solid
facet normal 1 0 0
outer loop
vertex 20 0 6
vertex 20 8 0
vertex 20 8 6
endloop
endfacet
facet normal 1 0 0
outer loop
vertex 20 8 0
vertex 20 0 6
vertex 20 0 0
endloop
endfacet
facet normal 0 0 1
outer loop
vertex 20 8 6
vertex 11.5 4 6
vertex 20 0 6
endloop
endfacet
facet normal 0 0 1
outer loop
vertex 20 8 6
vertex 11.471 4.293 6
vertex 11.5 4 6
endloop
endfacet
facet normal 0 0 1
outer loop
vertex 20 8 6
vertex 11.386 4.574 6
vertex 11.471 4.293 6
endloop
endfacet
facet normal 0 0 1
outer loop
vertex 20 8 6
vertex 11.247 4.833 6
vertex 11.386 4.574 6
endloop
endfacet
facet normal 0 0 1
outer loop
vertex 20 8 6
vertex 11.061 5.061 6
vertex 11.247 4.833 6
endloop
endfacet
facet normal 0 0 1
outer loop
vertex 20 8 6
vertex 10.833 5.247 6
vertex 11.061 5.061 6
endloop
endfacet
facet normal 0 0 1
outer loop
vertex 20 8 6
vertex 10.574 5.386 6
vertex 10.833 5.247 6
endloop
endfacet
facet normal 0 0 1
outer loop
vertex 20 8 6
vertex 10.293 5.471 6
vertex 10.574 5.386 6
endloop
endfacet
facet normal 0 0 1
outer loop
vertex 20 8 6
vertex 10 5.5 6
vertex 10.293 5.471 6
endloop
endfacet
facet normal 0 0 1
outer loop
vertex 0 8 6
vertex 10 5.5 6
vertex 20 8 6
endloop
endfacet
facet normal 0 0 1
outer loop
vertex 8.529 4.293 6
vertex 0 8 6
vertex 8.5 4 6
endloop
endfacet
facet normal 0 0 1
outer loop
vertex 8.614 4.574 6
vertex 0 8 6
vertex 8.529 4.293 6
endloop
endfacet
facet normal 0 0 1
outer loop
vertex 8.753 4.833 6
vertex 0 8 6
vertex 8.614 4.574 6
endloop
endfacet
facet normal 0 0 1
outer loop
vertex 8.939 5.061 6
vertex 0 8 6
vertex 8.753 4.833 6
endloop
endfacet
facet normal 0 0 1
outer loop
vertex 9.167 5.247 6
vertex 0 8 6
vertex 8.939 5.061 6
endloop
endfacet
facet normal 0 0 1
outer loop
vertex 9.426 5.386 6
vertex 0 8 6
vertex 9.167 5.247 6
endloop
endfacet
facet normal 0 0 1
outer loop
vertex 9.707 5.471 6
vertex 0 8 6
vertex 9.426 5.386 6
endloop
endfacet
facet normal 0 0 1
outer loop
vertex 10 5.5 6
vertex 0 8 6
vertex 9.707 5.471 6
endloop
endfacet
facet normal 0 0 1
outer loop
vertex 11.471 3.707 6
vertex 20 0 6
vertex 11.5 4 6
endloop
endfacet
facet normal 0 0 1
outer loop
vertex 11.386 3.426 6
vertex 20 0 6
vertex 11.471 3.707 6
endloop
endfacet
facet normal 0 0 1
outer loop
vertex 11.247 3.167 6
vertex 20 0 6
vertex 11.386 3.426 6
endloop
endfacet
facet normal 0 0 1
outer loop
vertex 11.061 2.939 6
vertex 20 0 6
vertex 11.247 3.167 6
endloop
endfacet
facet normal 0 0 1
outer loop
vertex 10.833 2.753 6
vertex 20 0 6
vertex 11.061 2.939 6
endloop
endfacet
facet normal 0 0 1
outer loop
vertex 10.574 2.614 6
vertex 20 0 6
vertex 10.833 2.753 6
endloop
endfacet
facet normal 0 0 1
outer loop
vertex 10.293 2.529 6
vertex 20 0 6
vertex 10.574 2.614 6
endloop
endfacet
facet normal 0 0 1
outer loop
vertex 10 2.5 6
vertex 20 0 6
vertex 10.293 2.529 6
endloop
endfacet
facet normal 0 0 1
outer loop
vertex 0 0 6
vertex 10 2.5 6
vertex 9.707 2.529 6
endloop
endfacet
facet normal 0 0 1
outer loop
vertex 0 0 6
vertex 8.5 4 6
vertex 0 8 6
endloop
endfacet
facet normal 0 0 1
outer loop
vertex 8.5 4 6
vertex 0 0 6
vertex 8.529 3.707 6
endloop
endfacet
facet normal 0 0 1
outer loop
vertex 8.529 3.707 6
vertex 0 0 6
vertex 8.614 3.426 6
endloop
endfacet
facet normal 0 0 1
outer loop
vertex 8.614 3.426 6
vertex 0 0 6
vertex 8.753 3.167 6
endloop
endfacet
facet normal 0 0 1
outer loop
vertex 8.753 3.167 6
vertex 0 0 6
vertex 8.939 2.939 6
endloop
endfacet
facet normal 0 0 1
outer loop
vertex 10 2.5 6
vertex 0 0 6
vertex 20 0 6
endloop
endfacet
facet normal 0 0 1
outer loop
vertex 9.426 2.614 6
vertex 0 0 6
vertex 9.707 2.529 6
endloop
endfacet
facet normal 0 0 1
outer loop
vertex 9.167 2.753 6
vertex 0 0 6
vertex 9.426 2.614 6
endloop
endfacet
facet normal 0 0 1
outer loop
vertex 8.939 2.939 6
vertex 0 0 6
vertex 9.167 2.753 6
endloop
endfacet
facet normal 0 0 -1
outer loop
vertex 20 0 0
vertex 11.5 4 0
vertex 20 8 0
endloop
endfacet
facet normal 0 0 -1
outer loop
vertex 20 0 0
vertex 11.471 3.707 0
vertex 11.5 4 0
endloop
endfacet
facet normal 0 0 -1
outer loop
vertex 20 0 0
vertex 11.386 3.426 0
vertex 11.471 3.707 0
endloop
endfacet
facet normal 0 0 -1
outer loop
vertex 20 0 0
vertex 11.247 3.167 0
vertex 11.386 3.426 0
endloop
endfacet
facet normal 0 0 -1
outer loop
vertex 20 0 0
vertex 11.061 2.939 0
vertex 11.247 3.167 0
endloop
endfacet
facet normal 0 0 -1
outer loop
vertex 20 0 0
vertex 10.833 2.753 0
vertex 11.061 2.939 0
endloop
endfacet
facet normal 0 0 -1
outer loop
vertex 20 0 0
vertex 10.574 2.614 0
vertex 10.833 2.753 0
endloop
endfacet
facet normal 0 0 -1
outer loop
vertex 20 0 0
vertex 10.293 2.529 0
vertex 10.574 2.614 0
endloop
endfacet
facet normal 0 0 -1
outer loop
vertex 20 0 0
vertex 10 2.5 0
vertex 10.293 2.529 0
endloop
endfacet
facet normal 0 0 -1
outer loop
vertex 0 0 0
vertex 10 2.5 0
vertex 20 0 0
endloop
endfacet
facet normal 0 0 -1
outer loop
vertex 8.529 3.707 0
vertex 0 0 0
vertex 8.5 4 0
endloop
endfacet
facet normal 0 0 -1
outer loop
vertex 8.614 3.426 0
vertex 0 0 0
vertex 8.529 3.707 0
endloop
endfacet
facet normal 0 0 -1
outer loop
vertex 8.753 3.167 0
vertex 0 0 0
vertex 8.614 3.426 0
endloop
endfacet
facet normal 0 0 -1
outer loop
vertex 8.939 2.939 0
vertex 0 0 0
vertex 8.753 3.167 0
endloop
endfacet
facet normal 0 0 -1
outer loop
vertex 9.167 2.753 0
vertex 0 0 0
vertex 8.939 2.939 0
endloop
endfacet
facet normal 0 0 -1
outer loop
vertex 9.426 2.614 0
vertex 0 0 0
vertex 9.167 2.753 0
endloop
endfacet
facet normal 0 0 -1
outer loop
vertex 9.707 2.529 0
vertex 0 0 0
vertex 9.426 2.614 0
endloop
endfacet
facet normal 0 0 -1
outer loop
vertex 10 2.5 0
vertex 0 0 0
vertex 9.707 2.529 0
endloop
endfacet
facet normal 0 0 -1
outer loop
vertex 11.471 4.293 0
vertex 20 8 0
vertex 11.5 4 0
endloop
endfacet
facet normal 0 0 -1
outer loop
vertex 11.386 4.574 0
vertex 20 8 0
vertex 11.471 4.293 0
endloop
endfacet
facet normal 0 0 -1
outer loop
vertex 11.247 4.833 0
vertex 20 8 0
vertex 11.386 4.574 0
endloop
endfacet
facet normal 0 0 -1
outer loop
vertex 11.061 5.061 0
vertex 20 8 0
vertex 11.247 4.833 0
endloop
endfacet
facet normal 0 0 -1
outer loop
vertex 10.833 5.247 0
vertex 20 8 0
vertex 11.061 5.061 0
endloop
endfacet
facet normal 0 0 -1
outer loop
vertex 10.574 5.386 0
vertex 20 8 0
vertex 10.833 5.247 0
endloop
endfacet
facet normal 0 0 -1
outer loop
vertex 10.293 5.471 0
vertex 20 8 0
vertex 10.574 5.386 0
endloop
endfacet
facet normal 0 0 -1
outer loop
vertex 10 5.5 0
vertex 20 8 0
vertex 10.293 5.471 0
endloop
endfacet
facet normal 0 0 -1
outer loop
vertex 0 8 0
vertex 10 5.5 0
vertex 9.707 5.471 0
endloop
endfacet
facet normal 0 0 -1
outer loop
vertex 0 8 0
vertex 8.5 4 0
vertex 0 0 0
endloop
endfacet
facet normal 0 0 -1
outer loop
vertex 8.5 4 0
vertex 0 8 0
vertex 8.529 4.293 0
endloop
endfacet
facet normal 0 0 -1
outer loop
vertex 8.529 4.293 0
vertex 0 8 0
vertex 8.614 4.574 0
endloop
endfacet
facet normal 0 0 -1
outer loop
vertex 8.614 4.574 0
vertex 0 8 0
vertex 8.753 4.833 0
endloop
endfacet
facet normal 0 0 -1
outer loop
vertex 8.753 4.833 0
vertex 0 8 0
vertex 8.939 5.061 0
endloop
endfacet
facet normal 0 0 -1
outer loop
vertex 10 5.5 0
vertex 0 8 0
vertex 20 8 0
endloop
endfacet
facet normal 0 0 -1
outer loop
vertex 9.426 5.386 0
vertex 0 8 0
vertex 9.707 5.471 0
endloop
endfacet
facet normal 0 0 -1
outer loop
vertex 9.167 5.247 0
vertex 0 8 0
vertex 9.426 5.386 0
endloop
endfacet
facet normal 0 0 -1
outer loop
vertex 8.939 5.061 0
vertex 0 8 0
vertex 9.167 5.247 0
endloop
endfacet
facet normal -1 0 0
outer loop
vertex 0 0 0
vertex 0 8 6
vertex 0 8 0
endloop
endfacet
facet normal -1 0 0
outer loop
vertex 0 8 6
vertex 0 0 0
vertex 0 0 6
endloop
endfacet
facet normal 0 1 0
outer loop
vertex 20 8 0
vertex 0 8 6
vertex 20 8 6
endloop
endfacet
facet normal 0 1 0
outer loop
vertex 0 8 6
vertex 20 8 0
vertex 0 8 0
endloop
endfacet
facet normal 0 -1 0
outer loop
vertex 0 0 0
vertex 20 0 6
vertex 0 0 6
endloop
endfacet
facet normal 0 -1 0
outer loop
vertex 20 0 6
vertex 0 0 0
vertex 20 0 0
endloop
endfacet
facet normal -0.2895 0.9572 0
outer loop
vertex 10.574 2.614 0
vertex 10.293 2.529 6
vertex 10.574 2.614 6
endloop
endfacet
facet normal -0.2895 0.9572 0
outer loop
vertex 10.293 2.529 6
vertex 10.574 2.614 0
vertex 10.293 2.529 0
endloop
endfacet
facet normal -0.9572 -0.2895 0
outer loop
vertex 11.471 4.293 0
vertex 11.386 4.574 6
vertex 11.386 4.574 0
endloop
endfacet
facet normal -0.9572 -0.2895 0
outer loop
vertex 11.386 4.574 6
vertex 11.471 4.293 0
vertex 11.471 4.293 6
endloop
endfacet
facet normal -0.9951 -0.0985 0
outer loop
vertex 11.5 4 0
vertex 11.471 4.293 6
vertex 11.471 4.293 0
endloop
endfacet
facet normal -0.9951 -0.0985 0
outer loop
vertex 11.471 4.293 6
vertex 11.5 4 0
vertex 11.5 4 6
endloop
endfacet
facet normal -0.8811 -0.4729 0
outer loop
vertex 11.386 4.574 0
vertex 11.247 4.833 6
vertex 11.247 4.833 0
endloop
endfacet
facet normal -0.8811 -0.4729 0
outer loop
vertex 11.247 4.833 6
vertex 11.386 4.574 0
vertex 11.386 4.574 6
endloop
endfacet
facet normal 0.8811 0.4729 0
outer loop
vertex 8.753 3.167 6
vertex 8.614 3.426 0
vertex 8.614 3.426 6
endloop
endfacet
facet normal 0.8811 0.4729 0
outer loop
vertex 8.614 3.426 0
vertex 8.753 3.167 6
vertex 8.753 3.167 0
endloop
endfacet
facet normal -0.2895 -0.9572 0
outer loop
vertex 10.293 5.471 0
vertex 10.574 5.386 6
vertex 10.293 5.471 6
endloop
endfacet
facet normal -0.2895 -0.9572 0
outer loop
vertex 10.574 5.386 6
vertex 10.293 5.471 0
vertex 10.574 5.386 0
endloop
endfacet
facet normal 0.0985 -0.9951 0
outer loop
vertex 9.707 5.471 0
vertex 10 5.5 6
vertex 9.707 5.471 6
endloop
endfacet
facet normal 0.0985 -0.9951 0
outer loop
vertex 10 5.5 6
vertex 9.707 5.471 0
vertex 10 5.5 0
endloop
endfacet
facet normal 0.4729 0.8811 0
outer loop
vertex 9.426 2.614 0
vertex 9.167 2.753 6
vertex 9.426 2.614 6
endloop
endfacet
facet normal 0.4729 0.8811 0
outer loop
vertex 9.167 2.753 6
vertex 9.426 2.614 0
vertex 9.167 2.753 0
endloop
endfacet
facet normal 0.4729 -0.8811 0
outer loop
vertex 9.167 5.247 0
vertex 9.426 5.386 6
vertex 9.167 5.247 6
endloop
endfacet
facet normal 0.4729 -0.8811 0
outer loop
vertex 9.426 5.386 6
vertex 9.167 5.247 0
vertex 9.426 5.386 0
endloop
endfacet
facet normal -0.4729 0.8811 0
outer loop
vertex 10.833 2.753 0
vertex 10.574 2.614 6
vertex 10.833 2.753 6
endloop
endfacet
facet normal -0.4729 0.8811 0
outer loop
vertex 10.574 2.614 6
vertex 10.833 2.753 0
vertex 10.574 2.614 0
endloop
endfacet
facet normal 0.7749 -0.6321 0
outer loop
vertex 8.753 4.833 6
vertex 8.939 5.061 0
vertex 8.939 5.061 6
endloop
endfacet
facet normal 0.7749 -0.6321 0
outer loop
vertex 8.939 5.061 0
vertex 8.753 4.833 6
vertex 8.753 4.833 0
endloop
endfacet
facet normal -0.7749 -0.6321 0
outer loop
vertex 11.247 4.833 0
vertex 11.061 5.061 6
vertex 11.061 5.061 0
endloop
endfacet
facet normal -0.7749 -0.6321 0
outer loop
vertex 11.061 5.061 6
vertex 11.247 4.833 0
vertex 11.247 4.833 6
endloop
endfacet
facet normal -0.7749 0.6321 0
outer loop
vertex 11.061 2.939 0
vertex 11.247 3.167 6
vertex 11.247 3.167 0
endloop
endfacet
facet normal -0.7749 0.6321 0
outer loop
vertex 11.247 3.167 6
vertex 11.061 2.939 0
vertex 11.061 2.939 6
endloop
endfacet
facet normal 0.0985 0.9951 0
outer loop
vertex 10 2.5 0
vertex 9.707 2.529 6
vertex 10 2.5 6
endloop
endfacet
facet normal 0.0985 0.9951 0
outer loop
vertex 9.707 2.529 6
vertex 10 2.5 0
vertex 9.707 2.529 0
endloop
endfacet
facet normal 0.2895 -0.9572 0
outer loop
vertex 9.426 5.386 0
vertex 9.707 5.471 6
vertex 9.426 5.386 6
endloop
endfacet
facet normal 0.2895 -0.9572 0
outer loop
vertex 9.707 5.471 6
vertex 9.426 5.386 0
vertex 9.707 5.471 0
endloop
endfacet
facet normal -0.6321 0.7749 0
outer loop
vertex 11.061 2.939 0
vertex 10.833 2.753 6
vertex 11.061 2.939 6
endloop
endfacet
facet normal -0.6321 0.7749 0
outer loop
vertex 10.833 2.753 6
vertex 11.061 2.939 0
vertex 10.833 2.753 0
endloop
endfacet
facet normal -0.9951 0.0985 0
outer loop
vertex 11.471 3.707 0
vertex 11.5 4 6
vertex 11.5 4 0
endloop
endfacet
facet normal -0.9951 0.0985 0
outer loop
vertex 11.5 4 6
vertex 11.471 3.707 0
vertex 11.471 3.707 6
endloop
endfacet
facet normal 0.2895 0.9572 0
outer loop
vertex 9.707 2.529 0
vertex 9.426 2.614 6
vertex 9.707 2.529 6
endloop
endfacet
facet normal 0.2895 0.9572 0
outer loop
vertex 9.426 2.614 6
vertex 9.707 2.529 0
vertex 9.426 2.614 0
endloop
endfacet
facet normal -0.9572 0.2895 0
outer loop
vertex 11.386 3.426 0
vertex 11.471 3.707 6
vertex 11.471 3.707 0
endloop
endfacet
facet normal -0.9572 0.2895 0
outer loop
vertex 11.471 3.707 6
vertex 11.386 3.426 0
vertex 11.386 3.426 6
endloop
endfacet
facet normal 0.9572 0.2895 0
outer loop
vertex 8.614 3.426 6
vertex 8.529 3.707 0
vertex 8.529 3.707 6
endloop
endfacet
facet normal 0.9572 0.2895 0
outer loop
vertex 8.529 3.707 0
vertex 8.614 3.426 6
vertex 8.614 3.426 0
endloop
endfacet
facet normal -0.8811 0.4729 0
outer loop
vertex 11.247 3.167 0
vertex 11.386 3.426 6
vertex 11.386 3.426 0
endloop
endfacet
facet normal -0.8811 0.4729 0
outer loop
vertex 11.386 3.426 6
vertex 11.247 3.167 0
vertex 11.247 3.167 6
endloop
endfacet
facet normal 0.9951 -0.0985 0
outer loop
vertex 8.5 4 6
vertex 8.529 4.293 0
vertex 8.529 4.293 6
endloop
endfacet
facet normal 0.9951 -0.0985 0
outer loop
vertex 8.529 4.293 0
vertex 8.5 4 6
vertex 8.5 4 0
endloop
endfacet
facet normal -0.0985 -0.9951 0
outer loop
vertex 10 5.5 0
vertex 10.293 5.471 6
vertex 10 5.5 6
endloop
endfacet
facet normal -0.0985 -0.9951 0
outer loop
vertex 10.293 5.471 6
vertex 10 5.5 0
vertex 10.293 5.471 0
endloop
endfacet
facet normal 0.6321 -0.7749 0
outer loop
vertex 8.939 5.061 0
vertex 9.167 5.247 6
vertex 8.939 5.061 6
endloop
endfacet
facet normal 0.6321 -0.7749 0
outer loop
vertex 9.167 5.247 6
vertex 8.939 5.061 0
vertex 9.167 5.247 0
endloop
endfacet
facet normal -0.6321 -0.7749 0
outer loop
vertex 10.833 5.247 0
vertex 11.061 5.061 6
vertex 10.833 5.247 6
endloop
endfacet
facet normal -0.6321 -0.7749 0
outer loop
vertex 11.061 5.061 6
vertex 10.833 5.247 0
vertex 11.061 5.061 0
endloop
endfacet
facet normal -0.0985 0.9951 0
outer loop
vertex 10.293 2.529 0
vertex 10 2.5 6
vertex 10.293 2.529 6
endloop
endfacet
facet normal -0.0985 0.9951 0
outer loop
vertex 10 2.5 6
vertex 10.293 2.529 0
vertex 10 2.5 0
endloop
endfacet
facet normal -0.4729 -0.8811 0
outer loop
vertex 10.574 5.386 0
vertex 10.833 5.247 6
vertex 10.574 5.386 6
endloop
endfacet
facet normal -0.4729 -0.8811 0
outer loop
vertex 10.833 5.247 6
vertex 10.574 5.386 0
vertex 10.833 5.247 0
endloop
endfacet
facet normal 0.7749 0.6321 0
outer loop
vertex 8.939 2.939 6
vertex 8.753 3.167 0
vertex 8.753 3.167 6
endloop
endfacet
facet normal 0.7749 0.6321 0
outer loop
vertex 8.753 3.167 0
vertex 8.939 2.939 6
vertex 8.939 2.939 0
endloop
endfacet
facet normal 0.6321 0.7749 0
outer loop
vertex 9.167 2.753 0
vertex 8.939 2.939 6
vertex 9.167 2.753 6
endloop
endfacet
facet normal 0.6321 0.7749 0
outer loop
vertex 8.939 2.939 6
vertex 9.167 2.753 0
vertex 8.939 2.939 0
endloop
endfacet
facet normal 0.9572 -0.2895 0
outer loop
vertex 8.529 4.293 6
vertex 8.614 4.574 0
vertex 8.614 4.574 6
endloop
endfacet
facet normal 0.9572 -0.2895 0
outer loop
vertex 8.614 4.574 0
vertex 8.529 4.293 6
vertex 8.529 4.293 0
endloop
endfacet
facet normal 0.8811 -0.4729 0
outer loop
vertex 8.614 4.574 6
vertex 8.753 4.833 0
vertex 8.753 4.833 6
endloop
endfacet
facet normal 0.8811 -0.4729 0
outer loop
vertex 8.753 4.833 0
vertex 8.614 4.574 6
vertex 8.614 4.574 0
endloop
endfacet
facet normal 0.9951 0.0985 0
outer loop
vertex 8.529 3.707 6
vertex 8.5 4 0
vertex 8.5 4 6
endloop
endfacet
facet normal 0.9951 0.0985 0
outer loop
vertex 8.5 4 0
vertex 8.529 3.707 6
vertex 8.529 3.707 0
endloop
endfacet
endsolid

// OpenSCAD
$fn = 32;

// ----------------------------------------------------------------------
// Micro pad: drilled pad, 5-20 mm class
// ----------------------------------------------------------------------

// --- parameters (mm) ---
pad_l = 20;               // pad length, X
pad_w = 8;                // pad width, Y
pad_t = 6;                // pad thickness, Z
hole_d = 3;               // through hole diameter
fit_tol = 0.05;           // tolerance for press fits, mm
free_tol = 0.3;           // tolerance for clearance fits, mm

difference() {
  cube([pad_l, pad_w, pad_t]);
  translate([pad_l / 2, pad_w / 2, -1])
    cylinder(h = pad_t + 2, d = hole_d);
}
